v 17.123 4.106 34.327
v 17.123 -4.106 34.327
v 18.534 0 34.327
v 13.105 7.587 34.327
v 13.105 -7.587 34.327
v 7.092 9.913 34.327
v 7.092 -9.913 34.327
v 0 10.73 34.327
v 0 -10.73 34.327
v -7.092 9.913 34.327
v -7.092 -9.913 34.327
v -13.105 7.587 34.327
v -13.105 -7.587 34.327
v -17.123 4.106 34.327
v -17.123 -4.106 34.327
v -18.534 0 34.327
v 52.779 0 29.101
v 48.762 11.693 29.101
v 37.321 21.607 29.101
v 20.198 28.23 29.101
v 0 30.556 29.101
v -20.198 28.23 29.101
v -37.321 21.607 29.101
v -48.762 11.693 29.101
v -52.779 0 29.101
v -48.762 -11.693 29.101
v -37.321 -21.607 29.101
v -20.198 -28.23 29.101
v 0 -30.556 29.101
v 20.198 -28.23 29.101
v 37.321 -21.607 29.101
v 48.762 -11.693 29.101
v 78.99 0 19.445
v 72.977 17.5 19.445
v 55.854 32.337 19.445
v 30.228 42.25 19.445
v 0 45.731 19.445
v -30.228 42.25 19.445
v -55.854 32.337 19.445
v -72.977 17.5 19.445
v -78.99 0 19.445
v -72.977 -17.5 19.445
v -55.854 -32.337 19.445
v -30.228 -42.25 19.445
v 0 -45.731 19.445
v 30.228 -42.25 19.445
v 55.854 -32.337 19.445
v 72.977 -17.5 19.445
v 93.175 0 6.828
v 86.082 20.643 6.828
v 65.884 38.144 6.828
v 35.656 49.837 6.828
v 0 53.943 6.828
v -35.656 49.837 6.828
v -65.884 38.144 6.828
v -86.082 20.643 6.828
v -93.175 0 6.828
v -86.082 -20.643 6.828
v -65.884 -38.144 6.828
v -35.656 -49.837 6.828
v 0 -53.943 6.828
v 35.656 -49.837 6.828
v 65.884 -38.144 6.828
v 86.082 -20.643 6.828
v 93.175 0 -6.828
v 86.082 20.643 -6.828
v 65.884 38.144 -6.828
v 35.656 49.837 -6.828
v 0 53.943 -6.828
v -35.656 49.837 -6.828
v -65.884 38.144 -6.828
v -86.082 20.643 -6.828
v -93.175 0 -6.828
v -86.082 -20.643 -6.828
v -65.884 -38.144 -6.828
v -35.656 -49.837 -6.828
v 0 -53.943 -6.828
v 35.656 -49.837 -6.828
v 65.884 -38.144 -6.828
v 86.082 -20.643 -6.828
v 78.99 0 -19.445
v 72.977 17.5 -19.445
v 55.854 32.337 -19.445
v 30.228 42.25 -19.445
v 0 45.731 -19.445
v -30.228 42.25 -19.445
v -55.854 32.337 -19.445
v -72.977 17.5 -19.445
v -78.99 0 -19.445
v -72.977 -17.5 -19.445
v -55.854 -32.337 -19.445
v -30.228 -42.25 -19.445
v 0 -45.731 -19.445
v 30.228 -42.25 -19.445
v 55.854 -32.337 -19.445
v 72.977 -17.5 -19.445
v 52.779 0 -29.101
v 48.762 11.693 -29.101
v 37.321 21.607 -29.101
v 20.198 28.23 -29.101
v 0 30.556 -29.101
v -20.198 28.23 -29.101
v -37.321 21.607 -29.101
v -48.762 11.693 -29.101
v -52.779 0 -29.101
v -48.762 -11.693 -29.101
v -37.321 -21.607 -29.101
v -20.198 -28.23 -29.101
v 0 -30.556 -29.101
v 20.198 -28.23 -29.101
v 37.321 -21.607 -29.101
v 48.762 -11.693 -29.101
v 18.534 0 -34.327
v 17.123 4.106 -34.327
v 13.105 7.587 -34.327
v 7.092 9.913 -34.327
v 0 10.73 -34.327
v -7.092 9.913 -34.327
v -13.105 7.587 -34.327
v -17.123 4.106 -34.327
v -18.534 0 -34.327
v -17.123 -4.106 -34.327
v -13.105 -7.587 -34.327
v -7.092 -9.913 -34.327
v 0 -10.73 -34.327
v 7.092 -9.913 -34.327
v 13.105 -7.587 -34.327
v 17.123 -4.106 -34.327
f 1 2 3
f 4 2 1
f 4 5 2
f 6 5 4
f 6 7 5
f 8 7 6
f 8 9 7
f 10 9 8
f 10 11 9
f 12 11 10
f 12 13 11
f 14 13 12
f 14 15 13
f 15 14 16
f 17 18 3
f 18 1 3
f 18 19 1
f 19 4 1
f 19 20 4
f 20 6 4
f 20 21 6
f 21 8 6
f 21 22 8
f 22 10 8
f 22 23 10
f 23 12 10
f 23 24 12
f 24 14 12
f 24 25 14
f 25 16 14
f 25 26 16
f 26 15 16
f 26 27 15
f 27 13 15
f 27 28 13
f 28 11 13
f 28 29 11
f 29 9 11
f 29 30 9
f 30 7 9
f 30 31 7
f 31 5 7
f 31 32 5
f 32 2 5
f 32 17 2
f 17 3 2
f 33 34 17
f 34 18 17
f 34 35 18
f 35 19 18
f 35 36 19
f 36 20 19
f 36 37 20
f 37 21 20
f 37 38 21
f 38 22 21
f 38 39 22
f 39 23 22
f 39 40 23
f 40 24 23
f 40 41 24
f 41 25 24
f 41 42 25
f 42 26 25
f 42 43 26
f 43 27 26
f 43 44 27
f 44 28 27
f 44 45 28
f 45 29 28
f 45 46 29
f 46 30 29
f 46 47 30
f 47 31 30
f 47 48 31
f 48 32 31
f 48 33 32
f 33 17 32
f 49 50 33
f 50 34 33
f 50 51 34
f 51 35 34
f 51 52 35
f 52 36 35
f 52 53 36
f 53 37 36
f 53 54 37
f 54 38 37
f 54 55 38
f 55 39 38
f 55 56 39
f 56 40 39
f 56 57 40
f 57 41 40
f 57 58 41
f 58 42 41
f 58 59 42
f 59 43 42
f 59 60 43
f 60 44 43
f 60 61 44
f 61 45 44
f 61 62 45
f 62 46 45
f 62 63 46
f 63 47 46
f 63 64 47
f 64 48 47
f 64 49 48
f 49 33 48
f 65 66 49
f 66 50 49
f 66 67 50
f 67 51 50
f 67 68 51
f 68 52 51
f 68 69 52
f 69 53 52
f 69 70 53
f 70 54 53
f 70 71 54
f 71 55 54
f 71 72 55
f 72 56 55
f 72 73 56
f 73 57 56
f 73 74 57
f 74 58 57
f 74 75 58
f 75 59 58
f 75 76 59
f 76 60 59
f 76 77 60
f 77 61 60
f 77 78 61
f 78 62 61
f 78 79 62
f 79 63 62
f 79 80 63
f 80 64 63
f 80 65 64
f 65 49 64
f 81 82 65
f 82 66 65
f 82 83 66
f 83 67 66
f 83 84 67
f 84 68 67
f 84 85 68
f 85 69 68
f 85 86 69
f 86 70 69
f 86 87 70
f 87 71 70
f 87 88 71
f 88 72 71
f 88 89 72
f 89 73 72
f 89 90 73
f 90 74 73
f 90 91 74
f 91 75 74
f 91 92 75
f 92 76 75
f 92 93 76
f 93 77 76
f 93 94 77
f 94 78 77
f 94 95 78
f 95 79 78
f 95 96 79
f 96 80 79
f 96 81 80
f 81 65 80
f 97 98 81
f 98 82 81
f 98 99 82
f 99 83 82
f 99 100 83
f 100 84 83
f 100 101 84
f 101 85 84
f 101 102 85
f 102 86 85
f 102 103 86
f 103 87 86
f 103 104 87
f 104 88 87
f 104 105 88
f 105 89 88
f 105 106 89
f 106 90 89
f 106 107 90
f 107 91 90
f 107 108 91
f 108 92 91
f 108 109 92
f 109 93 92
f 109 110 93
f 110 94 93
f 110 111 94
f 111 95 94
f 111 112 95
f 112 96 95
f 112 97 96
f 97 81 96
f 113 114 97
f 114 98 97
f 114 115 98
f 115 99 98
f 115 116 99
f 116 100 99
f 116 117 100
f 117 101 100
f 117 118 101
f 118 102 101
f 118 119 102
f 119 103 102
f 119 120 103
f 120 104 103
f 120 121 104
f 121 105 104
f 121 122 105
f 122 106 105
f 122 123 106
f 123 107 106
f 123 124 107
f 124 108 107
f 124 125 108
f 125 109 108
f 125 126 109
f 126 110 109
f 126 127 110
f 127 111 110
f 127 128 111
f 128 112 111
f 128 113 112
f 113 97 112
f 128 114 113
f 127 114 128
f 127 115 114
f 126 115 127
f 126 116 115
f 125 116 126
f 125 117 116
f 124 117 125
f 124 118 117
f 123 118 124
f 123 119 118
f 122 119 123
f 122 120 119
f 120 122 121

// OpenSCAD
// Generated by SolidPython 1.0.1 on 2020-07-29 00:46:54


scale(v = [19, 11, 7]) {
	sphere(r = 5);
}
/***********************************************
*********      SolidPython code:      **********
************************************************
 
# import packages: SolidPython
from solid import *
from solid.utils import *
from itertools import chain, combinations, permutations


class Resize:

    def __init__(self, scad_file):
        self.scad_file = scad_file
        #self.scad_file = import_scad(scad_file)
        # cone/cylinder param:
        self.r1 = 0
        self.r2 = 0
        self.h = 0
        # rectangular prism param:
        self.w = 0
        self.l = 0
        # ellipse param:
        self.r = 0

    # import OpenScad code (file name corresponds to shape)


    # classify shape + parameters
    def assign(self, param1, param2, param3):
        if self.scad_file == 'cone.scad':
            self.r1 = param1
            self.r2 = param2
            self.h = param3
        elif self.scad_file == 'cylinder.scad':
            self.r1 = param1
            self.r2 = param2
            self.h = param3
        elif self.scad_file == 'rectangularPrism.scad':
            self.h = param1
            self.l = param2
            self.w = param3
        else:
            self.r = param1
            self.h = param2

    # resize parameters
    def iterate(self):
        x = range(3, 20, 2)
        i = 1
        if self.scad_file == 'cone.scad':
            tempList = list(permutations(x, 2))
            for temp in tempList:
                param1 = temp[0]
                param2 = temp[1]
                filepath = 'produced_scad_files/' + 'cone' + str(param1) + '_' + str(param2) + '_' + '.scad'
                scad_render_to_file(cylinder(h=param1, r1=param2, r2=0), filepath)

        elif self.scad_file == 'cylinder.scad':
            tempList = list(permutations(x, 3))
            for temp in tempList:
                param1 = temp[0]
                param2 = temp[1]
                filepath = 'produced_scad_files/' + 'cylinder' + str(param1) + '_' + str(param2) + '_' + '.scad'
                scad_render_to_file(cylinder(h=param1, r1=param2, r2=param2), filepath)

        elif self.scad_file == 'rectangularPrism.scad':
            tempList = list(permutations(x, 3))
            for temp in tempList:
                param1 = temp[0]
                param2 = temp[1]
                param3 = temp[2]
                filepath = 'produced_scad_files/' + 'rectangularPrism' + str(param1) + '_' + str(param2) + '_' + str(
                    param3) + '.scad'
                scad_render_to_file(cube(size=(param1, param2, param3)), filepath)

        elif self.scad_file == 'ellipse.scad':
            tempList = list(permutations(x, 4))
            for temp in tempList:
                param1 = temp[0]
                param2 = temp[1]
                param3 = temp[2]
                param4 = temp[3]
                filepath = 'produced_scad_files/' + 'ellipse' + str(param1) + '_' + str(param2) + '_' + str(param3) + '_' + str(param4) + '.scad'
                scad_render_to_file(scale([param1, param2, param3])(sphere(r=param4)), filepath)

    def render_to_scadfile(self):
        scad_render_to_file(scad, 'example.scad') 
 
************************************************/
